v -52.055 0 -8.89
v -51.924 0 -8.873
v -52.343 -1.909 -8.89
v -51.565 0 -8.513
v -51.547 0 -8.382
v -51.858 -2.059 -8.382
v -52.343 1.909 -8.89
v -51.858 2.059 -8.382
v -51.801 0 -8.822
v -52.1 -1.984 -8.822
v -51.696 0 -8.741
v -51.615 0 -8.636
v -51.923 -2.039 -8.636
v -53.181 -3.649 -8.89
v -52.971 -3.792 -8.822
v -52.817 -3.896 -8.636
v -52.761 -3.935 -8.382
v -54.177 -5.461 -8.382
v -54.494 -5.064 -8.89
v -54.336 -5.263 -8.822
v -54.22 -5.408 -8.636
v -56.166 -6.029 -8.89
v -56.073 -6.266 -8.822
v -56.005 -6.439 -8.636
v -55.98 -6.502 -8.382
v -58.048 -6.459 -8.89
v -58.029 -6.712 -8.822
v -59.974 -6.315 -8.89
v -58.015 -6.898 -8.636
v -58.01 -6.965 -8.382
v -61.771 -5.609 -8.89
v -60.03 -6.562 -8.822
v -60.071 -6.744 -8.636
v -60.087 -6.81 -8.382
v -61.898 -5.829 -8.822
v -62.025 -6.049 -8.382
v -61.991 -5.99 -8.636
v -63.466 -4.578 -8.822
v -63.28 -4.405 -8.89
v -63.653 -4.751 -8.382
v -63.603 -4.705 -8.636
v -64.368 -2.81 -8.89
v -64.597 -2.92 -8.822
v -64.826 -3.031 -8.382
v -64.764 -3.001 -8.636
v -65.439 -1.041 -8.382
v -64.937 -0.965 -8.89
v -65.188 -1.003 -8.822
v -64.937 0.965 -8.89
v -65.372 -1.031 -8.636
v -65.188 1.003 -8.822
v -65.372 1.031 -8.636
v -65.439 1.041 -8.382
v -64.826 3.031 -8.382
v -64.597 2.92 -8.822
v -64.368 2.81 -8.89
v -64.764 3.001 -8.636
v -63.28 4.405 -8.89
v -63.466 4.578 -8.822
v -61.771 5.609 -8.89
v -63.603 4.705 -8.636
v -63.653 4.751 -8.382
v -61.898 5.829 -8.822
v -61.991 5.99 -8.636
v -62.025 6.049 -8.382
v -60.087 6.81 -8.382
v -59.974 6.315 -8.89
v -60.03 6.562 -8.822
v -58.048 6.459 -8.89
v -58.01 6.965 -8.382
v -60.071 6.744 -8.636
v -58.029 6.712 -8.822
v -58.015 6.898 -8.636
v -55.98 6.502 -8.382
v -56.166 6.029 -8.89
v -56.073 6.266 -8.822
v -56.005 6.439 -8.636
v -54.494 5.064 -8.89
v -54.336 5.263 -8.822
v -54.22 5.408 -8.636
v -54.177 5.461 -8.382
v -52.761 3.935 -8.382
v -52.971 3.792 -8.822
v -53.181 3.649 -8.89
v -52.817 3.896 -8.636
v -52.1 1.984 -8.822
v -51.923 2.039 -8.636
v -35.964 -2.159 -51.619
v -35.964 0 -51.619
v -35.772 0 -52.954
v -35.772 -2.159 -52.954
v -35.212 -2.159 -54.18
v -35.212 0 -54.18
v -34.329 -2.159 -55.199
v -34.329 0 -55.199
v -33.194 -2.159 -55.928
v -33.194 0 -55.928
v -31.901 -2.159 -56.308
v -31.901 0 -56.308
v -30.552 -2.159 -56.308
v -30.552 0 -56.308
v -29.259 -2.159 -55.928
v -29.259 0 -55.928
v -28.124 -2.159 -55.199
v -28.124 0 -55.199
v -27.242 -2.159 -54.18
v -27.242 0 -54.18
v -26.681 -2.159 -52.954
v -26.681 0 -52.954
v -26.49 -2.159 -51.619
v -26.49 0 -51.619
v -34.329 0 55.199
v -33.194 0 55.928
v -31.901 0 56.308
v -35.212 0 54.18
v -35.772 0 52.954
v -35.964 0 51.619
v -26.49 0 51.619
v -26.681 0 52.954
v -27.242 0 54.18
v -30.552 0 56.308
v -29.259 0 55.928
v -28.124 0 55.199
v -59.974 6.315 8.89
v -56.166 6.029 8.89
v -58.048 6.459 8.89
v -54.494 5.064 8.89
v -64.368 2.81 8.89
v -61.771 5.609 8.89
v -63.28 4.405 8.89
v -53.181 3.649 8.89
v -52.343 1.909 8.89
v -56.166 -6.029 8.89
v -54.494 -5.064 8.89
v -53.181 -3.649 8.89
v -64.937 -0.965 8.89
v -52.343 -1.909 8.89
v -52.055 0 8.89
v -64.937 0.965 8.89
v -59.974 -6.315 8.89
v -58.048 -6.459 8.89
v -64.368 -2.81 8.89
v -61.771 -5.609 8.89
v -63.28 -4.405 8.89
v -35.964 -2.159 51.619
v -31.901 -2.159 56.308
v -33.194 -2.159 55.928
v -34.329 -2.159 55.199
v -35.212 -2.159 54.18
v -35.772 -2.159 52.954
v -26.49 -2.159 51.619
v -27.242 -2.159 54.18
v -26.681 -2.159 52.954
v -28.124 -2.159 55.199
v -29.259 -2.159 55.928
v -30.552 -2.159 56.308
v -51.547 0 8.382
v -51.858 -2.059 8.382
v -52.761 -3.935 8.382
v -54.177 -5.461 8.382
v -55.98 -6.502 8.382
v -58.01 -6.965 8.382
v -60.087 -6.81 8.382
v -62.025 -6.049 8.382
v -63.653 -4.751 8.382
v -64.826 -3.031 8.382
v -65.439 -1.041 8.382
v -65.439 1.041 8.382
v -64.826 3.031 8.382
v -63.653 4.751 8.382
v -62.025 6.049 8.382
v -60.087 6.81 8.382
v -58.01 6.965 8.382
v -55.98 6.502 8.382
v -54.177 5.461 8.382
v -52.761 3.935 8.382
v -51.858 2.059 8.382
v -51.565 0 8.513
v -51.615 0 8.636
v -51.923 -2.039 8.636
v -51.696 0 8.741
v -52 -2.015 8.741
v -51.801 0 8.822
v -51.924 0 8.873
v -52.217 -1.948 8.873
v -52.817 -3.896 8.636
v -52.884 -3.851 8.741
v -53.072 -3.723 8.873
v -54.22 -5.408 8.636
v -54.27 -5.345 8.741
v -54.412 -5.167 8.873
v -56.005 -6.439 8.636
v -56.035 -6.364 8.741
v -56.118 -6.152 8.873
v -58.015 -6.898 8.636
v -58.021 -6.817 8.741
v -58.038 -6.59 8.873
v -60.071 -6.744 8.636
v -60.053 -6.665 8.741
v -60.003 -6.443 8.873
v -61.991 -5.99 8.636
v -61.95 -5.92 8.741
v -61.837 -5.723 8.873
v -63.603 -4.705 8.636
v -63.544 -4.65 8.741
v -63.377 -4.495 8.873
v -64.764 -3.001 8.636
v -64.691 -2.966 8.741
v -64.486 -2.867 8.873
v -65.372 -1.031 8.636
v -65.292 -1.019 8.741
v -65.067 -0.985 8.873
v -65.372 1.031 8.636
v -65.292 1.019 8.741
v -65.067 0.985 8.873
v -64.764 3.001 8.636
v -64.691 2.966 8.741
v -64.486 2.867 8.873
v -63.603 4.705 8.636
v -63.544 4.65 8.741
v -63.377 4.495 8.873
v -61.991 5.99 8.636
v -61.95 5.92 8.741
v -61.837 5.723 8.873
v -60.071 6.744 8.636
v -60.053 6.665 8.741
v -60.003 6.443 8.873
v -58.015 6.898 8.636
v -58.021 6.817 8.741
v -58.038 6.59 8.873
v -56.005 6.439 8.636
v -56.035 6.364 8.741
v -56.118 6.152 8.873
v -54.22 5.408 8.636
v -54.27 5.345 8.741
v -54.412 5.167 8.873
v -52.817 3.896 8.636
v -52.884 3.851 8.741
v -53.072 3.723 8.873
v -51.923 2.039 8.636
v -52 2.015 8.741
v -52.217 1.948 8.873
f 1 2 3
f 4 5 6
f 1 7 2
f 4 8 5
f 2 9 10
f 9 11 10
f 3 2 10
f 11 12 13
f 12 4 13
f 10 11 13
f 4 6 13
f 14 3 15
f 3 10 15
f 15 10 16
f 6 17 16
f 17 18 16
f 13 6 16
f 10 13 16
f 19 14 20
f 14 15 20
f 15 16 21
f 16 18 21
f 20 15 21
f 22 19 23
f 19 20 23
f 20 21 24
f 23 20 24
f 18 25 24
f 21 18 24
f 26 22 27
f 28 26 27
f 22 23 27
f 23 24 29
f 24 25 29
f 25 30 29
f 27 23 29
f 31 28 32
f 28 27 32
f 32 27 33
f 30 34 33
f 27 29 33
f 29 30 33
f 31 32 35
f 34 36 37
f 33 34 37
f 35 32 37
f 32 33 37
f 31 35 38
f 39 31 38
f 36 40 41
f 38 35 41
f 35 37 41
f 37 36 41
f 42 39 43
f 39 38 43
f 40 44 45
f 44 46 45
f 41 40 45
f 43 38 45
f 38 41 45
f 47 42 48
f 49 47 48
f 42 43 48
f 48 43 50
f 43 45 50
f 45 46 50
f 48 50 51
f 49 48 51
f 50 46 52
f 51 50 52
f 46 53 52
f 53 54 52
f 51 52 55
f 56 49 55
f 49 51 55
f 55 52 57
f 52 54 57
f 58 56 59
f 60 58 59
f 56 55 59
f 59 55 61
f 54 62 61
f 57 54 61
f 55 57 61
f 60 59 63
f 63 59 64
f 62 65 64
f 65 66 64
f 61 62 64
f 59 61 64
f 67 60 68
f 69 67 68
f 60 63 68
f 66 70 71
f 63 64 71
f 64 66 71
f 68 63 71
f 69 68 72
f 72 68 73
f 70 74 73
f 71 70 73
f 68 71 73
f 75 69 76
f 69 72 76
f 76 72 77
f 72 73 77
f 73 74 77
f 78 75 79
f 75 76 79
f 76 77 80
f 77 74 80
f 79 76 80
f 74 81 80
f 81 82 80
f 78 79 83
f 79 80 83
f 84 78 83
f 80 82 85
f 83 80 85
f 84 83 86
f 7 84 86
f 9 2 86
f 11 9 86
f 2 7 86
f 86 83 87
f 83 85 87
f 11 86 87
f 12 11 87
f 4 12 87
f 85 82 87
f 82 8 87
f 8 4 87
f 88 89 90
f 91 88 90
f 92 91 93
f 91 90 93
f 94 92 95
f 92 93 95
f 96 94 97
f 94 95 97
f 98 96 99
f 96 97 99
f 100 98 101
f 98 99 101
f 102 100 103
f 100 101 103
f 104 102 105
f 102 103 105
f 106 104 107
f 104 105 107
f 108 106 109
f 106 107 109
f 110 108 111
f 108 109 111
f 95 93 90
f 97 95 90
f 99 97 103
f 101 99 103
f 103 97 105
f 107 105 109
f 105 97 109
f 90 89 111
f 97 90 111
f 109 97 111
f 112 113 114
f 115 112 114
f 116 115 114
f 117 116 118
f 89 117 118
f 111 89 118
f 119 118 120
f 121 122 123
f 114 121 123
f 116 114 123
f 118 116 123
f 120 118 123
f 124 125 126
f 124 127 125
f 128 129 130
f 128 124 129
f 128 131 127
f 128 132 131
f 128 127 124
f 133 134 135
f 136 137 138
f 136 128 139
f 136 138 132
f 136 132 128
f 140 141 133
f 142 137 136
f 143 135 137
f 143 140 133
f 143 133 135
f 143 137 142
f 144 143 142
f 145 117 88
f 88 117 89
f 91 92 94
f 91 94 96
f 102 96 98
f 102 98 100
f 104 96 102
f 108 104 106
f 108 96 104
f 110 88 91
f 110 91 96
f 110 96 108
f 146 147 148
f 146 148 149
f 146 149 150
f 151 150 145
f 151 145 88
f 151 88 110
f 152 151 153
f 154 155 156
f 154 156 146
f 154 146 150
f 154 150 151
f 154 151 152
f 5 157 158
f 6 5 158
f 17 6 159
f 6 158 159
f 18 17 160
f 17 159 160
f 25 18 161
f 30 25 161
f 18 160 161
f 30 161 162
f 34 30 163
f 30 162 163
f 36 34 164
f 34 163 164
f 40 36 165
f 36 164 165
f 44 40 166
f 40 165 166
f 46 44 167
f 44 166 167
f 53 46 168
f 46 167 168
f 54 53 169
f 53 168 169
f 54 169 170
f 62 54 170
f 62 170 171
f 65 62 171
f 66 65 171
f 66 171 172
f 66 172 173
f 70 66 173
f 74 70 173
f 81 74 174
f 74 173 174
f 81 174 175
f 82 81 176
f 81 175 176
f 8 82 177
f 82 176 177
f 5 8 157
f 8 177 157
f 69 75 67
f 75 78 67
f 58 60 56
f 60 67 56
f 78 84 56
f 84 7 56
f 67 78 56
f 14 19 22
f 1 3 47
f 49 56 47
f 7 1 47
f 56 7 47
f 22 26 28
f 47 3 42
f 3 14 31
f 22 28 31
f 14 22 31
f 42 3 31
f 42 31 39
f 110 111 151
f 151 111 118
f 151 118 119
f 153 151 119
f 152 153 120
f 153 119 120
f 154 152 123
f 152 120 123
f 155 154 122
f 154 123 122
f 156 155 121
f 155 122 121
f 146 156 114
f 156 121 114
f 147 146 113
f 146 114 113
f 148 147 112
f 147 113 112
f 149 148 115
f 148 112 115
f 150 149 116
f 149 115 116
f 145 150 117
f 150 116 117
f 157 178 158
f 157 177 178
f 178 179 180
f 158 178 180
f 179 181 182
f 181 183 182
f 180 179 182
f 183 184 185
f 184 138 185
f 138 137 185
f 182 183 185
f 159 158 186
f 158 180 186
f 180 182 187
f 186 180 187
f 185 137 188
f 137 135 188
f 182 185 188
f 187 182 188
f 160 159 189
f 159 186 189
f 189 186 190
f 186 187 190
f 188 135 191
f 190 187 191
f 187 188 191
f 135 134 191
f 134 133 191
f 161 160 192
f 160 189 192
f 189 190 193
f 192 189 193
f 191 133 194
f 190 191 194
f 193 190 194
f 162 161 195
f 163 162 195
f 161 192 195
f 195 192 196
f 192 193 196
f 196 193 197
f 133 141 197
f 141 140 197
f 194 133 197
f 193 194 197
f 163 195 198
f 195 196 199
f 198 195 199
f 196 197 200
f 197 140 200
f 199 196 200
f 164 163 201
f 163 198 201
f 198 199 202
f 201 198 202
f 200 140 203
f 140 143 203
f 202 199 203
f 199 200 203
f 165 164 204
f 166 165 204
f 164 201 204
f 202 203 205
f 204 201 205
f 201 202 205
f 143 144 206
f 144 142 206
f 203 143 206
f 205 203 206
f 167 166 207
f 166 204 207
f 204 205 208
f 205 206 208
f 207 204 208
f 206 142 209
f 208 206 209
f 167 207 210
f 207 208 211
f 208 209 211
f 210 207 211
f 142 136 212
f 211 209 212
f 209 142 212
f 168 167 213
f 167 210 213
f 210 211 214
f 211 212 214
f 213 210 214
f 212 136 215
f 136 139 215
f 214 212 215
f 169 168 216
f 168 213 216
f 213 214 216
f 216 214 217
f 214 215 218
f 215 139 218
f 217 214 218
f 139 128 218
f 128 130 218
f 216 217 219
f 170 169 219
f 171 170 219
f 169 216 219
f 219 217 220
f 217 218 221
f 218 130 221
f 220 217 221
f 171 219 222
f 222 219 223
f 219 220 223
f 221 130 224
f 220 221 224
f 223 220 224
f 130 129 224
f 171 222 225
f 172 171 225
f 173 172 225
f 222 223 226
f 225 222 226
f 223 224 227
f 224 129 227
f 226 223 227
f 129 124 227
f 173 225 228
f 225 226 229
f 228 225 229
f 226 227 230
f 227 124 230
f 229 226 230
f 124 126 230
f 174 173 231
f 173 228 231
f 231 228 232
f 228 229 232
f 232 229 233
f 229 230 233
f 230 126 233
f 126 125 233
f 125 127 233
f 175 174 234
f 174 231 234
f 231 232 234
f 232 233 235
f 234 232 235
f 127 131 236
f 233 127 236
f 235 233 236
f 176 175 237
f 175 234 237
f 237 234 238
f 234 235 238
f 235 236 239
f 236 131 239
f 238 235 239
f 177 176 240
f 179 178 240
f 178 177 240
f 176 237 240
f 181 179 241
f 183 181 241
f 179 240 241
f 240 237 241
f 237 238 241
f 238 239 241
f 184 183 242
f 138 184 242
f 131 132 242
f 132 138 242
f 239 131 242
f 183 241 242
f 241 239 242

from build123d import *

# Parameters (mm, degrees)
F0_W     = 6.985
F0_H     = 17.78
F2_R     = 0.508
F4_DEPTH = 2.159


with BuildPart() as f1:
    # F0 (on Front) → F1 (revolve)
    with BuildSketch(Plane.XZ):
        with Locations((-55.0397741815, 0)):
            Rectangle(F0_W, F0_H)
    revolve(axis=Axis((-58.5322741815, 0, 0), (0, 0, -1)))

    # F2
    f2_edges = [f1.edges().sort_by_distance(p)[0] for p in [
        (-65.517274, 0, 8.89),
        (-65.517274, 0, -8.89),
        (-51.547274, 0, 0),
    ]]
    fillet(f2_edges, radius=F2_R)


with BuildPart() as f4:
    # F3 (on Front) → F4 (new body)
    with BuildSketch(Plane.XZ):
        with BuildLine():
            Line((-26.4895358072, -51.61915), (-26.4895358072, 51.61915))
            ThreePointArc((-26.4895358072, 51.61915), (-31.2266358072, 56.35625), (-35.9637358072, 51.61915))
            Line((-35.9637358072, 51.61915), (-35.9637358072, -51.61915))
            ThreePointArc((-35.9637358072, -51.61915), (-31.2266358072, -56.35625), (-26.4895358072, -51.61915))
        make_face()
    extrude(amount=F4_DEPTH)


solid = Compound([f1.part, f4.part])
